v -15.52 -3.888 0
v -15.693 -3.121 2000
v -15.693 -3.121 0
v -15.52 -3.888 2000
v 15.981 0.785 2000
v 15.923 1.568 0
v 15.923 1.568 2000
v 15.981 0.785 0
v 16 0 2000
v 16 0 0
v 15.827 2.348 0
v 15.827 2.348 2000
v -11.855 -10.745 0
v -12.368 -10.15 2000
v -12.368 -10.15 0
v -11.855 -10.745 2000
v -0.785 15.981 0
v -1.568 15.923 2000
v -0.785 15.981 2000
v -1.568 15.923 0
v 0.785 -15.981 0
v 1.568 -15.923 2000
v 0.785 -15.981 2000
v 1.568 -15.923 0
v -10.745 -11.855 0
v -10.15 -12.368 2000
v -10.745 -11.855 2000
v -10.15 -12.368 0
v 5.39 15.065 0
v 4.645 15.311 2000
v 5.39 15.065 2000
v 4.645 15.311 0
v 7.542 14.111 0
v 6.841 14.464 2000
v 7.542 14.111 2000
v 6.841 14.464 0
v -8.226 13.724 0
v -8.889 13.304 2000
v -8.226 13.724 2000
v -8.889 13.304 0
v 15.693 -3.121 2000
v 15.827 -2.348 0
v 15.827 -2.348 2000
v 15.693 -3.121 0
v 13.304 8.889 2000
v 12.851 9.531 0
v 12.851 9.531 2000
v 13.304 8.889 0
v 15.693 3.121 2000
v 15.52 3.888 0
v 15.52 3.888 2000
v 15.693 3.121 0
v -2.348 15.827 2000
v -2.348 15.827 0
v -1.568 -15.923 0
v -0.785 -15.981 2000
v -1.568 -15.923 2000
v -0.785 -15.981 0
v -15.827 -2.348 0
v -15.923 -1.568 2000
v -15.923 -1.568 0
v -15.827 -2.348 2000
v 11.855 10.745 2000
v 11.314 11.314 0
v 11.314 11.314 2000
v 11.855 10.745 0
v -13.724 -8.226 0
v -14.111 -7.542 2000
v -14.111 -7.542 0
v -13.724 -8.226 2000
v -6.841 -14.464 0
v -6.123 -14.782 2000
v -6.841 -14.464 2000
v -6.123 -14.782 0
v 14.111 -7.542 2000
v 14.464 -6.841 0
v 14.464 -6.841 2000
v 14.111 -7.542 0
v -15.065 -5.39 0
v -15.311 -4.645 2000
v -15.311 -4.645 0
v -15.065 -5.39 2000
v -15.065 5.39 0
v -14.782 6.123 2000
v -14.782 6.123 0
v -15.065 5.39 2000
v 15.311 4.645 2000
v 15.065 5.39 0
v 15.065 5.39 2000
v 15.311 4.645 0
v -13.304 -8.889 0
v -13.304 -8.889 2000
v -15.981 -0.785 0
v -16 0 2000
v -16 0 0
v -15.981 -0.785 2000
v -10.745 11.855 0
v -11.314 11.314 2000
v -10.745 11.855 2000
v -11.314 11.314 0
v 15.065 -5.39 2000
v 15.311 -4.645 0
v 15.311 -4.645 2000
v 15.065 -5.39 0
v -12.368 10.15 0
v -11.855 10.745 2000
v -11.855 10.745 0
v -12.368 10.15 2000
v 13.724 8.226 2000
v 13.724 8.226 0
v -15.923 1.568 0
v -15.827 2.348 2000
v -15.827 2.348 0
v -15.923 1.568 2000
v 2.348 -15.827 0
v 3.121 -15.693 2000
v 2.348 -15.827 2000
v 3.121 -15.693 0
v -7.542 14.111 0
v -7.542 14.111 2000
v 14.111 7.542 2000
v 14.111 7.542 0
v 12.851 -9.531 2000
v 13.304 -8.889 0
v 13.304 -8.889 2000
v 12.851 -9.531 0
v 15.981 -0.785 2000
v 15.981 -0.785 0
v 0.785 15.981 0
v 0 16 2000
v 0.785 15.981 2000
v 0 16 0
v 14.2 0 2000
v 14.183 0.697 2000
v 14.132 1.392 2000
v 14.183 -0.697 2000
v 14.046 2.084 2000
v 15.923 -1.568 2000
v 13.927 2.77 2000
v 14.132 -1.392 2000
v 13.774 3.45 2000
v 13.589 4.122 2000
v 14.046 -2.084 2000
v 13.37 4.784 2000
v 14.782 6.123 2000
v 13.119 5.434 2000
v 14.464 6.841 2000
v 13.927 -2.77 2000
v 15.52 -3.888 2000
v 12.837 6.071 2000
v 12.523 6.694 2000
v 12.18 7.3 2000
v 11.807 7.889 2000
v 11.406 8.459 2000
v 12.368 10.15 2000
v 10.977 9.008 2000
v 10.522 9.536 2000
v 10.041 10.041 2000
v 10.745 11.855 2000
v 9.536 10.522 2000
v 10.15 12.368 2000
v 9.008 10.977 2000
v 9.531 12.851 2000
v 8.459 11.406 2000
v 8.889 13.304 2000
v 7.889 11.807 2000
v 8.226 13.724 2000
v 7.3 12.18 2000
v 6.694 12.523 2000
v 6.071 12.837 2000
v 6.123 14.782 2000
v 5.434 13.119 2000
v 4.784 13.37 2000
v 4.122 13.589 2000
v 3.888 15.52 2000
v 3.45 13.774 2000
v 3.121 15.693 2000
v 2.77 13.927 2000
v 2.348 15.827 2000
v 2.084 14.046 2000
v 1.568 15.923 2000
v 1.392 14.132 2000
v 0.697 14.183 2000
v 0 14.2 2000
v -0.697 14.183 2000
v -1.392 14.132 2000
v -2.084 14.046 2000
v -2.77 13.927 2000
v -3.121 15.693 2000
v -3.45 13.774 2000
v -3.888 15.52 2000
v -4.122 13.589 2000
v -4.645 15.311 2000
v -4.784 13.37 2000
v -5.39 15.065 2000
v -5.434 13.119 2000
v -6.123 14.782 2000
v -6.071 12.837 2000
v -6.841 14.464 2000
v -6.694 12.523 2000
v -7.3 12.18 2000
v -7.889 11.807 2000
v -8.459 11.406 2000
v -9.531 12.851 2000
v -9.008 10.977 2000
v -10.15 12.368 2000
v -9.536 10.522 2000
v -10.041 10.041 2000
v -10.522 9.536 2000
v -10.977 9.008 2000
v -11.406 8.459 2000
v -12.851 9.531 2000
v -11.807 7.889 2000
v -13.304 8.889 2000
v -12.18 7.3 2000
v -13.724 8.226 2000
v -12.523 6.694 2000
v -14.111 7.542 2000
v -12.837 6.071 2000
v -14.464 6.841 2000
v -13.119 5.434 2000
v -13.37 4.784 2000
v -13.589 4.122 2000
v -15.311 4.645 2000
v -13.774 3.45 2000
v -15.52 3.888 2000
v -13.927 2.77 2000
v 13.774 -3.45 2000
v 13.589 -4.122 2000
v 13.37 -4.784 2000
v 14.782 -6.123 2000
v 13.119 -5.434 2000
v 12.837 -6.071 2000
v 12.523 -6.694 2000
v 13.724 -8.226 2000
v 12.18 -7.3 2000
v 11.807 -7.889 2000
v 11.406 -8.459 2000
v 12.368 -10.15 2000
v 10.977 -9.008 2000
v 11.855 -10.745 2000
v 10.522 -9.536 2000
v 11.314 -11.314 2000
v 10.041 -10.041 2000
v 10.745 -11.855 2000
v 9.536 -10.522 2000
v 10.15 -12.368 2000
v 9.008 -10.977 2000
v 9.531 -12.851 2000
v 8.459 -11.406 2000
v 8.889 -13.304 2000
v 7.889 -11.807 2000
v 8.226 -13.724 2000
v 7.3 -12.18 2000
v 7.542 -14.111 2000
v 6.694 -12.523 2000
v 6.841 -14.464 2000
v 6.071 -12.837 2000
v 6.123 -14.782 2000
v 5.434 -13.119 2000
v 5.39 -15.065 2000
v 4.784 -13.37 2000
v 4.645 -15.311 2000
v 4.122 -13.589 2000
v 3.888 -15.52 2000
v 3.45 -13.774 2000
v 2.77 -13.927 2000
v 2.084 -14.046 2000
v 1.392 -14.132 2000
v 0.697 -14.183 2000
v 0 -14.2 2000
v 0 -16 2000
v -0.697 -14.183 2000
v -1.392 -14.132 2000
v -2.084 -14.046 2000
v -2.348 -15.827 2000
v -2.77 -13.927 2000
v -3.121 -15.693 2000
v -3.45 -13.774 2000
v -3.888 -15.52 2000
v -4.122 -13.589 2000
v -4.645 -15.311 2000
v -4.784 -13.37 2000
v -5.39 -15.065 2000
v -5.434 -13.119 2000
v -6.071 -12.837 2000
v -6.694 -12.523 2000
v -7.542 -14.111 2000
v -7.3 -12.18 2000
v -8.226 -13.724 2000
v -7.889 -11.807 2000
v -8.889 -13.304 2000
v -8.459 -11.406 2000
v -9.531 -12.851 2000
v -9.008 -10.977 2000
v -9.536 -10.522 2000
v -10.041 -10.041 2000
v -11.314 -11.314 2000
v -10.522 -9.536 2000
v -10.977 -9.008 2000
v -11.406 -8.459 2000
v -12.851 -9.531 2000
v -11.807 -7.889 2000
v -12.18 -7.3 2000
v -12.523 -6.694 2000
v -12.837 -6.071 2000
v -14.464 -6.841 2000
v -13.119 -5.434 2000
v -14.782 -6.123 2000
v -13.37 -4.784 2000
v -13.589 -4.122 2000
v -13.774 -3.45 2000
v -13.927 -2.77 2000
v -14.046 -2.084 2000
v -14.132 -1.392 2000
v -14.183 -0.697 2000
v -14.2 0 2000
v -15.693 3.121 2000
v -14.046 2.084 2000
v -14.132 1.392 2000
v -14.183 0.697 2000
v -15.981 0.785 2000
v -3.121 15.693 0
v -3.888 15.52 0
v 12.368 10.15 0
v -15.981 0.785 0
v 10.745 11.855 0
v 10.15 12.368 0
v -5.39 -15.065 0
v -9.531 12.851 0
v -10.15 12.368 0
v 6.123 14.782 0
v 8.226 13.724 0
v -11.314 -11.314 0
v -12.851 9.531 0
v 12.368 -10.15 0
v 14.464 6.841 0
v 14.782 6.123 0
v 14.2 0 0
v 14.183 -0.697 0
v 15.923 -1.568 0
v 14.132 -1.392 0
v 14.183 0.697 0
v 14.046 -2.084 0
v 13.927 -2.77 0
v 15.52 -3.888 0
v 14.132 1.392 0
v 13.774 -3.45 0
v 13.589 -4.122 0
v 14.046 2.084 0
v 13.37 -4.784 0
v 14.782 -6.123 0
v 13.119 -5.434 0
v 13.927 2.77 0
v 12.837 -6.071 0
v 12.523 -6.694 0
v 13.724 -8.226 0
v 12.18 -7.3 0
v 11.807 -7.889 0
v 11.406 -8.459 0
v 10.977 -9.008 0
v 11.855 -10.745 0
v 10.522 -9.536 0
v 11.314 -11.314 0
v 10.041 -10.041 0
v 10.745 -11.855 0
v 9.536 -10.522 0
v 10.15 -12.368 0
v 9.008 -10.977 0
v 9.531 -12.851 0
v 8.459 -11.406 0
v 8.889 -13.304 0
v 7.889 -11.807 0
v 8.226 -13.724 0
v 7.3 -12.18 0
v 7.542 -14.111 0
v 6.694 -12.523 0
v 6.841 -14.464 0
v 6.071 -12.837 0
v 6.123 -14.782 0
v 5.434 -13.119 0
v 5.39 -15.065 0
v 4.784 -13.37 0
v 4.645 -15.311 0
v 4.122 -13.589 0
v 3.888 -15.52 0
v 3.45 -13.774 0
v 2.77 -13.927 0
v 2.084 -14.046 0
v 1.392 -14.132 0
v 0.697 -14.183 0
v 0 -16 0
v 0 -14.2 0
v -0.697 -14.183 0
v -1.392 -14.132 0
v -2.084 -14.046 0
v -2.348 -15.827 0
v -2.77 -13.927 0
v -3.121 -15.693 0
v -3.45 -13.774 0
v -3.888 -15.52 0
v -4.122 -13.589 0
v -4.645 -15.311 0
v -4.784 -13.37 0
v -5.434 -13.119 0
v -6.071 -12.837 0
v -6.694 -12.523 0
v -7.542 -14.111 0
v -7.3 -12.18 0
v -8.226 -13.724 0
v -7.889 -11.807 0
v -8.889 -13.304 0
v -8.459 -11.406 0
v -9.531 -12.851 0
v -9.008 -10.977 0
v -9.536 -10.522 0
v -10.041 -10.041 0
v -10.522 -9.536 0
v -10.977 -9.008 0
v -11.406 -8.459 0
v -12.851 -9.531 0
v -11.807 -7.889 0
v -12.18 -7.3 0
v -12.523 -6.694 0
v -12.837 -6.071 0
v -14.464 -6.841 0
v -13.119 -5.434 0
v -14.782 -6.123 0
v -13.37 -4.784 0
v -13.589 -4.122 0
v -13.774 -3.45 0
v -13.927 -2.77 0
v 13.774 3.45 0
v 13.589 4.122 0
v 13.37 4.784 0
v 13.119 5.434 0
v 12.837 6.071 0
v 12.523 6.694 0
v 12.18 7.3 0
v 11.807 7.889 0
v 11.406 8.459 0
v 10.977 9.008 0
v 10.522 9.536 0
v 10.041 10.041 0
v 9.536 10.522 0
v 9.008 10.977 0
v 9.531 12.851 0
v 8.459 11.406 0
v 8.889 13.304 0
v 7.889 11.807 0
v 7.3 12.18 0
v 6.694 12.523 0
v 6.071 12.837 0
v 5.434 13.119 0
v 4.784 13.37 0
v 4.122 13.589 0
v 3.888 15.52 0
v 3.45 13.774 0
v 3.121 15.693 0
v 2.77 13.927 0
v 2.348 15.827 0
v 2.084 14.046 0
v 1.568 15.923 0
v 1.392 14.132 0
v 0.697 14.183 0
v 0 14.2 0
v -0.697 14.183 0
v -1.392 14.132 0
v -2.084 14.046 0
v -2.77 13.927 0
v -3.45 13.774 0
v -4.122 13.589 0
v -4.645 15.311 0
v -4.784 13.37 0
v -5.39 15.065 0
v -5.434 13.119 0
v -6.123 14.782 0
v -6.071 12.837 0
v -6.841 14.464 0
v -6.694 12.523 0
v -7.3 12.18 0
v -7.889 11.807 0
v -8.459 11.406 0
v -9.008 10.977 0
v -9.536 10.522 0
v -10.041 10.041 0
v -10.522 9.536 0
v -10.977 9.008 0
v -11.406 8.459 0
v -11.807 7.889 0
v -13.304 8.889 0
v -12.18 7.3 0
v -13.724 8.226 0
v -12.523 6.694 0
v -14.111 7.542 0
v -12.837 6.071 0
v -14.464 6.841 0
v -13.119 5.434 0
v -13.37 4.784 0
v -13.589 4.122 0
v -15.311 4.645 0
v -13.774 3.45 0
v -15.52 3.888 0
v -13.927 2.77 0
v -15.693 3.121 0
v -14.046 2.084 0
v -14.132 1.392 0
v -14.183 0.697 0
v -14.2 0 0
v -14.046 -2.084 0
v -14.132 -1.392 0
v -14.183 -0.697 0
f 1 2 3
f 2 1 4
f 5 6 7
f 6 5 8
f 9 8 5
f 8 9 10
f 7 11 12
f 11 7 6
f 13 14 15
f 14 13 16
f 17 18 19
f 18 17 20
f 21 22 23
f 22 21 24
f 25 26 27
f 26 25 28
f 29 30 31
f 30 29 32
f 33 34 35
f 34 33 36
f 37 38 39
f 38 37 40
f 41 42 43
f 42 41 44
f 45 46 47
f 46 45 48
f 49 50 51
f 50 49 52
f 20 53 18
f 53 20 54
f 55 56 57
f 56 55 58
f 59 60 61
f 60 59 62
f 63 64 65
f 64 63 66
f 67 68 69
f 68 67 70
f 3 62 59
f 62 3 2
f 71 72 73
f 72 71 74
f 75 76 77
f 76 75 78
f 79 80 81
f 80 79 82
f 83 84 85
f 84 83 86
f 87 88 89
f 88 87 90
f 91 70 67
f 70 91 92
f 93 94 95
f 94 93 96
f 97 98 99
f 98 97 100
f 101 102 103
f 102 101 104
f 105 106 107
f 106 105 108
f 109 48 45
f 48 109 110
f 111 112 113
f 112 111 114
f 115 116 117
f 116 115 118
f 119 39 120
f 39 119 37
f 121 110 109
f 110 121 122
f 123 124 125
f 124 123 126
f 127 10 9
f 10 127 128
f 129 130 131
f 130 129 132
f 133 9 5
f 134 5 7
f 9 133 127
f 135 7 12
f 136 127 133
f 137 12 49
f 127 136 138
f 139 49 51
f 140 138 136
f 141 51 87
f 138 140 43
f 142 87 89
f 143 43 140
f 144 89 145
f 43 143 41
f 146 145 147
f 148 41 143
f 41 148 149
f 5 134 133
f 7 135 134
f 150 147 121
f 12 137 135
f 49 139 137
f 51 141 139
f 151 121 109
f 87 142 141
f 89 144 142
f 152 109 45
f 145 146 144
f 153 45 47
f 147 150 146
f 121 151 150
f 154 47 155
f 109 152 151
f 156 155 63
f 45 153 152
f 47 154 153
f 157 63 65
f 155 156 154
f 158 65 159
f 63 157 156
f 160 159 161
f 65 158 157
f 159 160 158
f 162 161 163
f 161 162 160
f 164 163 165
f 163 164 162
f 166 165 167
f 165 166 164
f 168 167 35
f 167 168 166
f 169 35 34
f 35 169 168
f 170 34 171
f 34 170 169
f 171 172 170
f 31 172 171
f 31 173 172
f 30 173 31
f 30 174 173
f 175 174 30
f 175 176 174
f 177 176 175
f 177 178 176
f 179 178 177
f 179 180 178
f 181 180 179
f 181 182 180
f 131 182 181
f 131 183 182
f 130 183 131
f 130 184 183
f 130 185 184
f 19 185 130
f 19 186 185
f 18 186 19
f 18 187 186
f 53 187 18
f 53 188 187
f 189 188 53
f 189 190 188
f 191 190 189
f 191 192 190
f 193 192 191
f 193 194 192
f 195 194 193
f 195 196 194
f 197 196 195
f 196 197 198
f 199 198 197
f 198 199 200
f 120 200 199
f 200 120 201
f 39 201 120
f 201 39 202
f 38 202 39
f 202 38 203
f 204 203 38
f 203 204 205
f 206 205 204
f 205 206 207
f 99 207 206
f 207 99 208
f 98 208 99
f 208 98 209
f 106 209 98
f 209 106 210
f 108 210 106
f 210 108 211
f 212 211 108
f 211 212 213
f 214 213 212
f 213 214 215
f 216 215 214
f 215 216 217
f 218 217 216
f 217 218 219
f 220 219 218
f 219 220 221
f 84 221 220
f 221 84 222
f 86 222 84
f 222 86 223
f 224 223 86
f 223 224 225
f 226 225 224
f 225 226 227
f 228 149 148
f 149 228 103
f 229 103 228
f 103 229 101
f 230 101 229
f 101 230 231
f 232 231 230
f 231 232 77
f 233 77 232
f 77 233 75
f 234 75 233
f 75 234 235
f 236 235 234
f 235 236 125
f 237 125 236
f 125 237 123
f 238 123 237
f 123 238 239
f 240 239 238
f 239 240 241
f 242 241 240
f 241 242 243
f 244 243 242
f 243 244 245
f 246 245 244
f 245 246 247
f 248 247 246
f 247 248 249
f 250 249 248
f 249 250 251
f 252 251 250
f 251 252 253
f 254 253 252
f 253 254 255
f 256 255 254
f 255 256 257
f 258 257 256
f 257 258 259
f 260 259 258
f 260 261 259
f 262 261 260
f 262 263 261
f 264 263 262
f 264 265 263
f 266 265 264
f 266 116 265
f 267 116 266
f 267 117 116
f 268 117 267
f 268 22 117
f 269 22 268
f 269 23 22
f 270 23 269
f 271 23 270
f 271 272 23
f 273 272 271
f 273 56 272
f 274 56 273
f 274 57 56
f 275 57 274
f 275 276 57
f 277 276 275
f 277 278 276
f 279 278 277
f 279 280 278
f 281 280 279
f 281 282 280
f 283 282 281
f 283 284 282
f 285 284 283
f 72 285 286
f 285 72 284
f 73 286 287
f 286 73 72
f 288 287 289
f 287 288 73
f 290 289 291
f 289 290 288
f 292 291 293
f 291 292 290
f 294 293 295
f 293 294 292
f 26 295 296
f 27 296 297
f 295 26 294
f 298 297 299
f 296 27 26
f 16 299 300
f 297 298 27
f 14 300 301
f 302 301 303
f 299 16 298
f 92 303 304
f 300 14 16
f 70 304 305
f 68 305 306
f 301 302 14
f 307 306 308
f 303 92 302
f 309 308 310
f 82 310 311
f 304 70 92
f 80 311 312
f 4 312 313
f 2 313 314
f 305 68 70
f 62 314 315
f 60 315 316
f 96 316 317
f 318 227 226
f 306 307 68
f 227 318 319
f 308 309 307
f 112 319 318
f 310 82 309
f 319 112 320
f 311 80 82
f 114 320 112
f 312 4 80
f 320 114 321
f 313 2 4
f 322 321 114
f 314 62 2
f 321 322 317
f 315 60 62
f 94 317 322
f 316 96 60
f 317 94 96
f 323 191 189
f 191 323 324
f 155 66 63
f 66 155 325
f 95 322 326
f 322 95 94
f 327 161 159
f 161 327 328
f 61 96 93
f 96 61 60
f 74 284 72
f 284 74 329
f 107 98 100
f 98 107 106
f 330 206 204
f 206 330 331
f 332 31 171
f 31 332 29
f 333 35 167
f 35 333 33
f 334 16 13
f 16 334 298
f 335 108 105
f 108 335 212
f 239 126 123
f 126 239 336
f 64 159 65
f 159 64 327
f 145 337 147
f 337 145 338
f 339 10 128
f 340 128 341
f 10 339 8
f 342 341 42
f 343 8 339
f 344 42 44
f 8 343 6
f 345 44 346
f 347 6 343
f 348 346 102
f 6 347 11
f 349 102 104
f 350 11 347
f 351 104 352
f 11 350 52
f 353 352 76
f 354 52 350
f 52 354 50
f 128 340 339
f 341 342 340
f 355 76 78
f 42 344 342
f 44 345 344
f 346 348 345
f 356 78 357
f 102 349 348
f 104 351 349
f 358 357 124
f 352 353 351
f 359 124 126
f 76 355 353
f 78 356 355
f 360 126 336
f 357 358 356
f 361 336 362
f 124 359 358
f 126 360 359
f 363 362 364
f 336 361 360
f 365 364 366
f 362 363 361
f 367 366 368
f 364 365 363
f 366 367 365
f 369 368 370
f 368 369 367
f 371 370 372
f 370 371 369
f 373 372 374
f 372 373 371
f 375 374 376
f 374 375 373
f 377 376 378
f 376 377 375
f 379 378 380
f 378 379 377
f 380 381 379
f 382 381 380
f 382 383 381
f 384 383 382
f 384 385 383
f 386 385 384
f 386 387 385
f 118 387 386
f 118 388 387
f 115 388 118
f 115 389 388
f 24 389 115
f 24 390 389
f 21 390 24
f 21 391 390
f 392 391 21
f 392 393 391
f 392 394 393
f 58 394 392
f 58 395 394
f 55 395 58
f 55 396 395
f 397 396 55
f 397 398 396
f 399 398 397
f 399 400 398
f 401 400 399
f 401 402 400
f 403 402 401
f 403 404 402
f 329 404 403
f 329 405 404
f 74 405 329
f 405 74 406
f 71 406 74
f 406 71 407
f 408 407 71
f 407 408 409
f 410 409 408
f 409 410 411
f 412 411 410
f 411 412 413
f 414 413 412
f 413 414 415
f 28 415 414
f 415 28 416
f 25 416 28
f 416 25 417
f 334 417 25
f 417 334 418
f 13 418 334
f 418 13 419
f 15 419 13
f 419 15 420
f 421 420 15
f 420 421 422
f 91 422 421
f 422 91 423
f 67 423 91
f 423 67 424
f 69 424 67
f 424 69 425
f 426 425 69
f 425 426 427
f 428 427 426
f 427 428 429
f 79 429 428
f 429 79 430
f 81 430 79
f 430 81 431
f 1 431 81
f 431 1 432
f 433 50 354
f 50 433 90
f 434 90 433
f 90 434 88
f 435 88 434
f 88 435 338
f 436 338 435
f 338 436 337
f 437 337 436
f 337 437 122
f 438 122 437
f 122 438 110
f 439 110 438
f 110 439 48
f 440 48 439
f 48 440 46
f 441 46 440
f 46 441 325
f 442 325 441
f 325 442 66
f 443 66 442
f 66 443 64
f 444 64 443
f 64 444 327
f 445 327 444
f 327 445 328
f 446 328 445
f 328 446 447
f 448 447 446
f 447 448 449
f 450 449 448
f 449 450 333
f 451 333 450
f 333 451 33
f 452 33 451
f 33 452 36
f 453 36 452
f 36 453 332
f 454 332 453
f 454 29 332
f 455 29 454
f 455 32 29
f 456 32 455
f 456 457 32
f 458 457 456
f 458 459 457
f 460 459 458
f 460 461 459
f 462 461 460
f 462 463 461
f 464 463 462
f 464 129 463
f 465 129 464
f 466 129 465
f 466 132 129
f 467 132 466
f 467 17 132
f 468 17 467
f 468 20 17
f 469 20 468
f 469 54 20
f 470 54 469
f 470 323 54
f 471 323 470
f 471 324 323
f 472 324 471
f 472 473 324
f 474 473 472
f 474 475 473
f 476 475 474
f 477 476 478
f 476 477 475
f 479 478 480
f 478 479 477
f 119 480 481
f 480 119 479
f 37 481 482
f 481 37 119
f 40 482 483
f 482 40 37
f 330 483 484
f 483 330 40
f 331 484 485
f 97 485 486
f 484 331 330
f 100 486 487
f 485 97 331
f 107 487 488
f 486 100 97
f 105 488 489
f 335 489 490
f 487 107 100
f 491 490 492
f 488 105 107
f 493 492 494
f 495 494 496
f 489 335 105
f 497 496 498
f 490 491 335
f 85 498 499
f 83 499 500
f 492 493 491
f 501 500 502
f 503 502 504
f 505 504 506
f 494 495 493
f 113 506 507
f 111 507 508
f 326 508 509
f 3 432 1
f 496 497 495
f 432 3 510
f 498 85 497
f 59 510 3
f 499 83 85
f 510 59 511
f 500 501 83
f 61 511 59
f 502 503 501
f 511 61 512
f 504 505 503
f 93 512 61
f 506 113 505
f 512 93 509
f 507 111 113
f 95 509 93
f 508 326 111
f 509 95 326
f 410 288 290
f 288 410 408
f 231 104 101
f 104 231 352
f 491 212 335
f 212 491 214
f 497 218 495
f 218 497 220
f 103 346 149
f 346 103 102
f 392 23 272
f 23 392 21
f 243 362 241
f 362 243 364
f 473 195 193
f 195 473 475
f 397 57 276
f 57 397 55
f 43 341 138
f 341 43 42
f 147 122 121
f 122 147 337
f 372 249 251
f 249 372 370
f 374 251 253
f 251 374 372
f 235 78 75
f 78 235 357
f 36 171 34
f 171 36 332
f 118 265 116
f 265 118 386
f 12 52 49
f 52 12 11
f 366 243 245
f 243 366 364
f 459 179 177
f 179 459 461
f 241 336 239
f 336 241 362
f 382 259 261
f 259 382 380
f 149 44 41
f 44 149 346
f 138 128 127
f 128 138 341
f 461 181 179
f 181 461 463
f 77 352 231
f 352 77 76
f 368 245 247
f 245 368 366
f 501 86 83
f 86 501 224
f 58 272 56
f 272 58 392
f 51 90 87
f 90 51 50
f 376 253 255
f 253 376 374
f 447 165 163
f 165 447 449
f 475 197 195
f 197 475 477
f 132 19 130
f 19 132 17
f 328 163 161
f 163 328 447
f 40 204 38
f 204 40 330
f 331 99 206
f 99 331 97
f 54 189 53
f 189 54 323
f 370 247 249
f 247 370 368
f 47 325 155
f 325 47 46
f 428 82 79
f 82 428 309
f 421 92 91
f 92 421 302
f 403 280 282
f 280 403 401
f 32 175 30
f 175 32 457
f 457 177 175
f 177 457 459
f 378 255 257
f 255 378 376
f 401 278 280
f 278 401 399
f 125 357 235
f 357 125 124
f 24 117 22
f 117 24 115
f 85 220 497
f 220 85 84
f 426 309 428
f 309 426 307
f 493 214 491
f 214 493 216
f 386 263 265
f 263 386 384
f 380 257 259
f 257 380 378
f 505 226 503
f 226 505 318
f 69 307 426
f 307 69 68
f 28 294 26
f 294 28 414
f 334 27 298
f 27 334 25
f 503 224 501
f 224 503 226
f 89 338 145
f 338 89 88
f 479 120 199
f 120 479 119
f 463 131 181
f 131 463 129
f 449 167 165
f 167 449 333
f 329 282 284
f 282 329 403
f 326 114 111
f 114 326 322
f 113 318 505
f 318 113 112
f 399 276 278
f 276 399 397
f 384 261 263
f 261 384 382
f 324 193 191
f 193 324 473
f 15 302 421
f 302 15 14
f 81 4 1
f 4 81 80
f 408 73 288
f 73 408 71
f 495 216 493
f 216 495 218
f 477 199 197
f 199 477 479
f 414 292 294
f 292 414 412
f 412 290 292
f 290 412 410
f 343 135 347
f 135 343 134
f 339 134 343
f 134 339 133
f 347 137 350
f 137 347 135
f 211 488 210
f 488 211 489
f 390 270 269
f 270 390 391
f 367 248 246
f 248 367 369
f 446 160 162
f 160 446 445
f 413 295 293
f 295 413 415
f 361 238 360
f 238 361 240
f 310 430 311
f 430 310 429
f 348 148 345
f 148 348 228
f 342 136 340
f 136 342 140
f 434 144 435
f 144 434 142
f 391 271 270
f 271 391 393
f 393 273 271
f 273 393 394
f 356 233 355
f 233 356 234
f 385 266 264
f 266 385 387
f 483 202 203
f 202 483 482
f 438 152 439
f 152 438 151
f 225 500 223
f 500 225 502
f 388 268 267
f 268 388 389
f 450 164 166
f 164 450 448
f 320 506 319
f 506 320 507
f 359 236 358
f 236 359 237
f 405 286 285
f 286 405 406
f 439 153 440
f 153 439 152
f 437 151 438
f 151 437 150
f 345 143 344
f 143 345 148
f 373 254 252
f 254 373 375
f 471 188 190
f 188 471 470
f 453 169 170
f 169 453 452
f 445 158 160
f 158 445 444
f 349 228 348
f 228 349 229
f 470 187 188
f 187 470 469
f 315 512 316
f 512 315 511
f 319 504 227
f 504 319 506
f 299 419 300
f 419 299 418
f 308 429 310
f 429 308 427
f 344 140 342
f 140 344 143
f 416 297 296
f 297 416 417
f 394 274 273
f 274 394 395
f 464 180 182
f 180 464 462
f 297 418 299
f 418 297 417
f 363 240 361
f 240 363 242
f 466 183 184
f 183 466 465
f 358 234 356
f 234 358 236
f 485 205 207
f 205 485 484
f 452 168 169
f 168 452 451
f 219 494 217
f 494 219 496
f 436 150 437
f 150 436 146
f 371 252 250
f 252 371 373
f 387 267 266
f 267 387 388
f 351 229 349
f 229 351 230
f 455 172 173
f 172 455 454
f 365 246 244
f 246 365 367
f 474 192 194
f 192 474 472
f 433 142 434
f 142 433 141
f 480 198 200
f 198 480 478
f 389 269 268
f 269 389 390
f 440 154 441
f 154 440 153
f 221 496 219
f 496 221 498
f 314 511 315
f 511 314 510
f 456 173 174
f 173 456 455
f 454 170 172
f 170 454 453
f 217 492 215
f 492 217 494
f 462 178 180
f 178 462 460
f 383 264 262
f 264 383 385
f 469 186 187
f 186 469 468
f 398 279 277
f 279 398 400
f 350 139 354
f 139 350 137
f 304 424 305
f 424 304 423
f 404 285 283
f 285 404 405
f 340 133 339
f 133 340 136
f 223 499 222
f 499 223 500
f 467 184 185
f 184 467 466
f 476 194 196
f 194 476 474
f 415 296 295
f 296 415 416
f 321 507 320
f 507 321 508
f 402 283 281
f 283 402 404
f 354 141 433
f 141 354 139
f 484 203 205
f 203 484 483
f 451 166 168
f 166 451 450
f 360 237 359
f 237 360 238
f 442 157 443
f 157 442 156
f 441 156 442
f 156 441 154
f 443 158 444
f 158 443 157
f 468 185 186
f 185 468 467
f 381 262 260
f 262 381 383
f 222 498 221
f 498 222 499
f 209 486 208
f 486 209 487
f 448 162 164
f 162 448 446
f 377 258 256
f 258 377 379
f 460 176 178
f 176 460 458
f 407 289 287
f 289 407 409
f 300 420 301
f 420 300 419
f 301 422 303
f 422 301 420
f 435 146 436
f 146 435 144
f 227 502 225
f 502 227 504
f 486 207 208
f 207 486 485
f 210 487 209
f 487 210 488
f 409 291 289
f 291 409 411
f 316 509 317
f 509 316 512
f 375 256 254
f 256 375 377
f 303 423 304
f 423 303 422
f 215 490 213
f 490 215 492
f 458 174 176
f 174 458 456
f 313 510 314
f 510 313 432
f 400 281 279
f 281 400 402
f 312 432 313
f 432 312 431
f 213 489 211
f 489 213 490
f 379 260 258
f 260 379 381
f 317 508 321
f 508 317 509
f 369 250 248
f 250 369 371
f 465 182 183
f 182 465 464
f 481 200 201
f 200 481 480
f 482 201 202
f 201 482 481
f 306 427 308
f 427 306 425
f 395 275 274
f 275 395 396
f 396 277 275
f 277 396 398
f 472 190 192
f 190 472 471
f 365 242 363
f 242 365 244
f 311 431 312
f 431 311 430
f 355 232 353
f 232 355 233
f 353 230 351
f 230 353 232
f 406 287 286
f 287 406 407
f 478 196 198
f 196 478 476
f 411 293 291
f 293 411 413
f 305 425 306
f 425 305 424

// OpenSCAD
$fn = 128;

// HT pipe parameters (approx. for HT 32)
outer_d = 32;        // mm
wall_th = 1.8;       // mm (typical range ~1.8-2.0)
inner_d = outer_d - 2*wall_th;

length = 2000;       // mm

module ht_pipe(od, id, L) {
    difference() {
        cylinder(h = L, d = od, center = false);
        translate([0,0,-0.1])
            cylinder(h = L + 0.2, d = id, center = false);
    }
}

ht_pipe(outer_d, inner_d, length);
